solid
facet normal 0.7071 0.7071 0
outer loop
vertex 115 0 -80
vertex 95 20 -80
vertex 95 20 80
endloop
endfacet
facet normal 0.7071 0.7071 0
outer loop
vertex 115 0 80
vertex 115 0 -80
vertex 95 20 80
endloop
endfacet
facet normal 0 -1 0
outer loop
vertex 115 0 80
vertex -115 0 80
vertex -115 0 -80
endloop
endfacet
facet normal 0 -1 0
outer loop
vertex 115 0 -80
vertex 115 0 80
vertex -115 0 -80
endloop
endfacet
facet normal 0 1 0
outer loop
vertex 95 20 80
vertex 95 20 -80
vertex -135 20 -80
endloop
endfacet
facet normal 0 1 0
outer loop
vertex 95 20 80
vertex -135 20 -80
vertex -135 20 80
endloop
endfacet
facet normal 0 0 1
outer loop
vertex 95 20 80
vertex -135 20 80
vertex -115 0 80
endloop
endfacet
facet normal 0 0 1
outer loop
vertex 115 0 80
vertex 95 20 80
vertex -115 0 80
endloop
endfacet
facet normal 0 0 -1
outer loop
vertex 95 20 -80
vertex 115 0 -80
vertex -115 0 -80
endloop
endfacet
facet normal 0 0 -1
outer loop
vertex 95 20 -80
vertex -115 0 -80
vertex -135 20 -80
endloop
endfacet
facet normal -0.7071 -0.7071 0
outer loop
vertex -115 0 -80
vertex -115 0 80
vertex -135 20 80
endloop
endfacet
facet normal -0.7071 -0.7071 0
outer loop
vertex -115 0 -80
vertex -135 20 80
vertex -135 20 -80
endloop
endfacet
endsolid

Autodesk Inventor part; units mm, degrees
ref_plane "YZ Plane" through (0, 0, 0) normal (1, 0, 0) x (0, 1, 0)
ref_plane "XZ Plane" through (0, 0, 0) normal (0, 1, 0) x (-1, 0, 0)
ref_plane "XY Plane" through (0, 0, 0) normal (0, 0, 1) x (1, 0, 0)
sketch "Sketch1" plane through (0, 0, 0) normal (0, 1, 0) x (-1, 0, 0)
  line L0 (-115, -80) -> (115, -80)
  line L1 (115, -80) -> (115, 80)
  line L2 (115, 80) -> (-115, 80)
  line L3 (-115, 80) -> (-115, -80)
  line L4 (-115, -80) -> (115, 80) construction
  line L5 (115, -80) -> (-115, 80) construction
  point P0 (0, 0)
  dimension "d0" = 230
  dimension "d1" = 160
extrude "Extrusion1" add sketch "Sketch1" along normal blind 20
chamfer "Chamfer1" distance 20 angle 45 1 edges at (115, 20, 0)
sketch "Sketch2" plane through (-115, 0, -80) normal (-1, 0, 0) x (0, 0, 1)
  line L0 (0, 20) -> (160, 20) projected
  line L1 (0, 20) -> (160, 20)
  line L2 (160, 20) -> (160, 0)
  line L3 (160, 0) -> (0, 0)
  line L4 (0, 0) -> (0, 20)
  point P0 (80, 0)
extrude "Extrusion2" add sketch "Sketch2" along normal blind 20
chamfer "Chamfer2" distance 20 angle 45 1 edges at (-135, 0, 0)
properties part number "FieldOfView" material "Titanium"
